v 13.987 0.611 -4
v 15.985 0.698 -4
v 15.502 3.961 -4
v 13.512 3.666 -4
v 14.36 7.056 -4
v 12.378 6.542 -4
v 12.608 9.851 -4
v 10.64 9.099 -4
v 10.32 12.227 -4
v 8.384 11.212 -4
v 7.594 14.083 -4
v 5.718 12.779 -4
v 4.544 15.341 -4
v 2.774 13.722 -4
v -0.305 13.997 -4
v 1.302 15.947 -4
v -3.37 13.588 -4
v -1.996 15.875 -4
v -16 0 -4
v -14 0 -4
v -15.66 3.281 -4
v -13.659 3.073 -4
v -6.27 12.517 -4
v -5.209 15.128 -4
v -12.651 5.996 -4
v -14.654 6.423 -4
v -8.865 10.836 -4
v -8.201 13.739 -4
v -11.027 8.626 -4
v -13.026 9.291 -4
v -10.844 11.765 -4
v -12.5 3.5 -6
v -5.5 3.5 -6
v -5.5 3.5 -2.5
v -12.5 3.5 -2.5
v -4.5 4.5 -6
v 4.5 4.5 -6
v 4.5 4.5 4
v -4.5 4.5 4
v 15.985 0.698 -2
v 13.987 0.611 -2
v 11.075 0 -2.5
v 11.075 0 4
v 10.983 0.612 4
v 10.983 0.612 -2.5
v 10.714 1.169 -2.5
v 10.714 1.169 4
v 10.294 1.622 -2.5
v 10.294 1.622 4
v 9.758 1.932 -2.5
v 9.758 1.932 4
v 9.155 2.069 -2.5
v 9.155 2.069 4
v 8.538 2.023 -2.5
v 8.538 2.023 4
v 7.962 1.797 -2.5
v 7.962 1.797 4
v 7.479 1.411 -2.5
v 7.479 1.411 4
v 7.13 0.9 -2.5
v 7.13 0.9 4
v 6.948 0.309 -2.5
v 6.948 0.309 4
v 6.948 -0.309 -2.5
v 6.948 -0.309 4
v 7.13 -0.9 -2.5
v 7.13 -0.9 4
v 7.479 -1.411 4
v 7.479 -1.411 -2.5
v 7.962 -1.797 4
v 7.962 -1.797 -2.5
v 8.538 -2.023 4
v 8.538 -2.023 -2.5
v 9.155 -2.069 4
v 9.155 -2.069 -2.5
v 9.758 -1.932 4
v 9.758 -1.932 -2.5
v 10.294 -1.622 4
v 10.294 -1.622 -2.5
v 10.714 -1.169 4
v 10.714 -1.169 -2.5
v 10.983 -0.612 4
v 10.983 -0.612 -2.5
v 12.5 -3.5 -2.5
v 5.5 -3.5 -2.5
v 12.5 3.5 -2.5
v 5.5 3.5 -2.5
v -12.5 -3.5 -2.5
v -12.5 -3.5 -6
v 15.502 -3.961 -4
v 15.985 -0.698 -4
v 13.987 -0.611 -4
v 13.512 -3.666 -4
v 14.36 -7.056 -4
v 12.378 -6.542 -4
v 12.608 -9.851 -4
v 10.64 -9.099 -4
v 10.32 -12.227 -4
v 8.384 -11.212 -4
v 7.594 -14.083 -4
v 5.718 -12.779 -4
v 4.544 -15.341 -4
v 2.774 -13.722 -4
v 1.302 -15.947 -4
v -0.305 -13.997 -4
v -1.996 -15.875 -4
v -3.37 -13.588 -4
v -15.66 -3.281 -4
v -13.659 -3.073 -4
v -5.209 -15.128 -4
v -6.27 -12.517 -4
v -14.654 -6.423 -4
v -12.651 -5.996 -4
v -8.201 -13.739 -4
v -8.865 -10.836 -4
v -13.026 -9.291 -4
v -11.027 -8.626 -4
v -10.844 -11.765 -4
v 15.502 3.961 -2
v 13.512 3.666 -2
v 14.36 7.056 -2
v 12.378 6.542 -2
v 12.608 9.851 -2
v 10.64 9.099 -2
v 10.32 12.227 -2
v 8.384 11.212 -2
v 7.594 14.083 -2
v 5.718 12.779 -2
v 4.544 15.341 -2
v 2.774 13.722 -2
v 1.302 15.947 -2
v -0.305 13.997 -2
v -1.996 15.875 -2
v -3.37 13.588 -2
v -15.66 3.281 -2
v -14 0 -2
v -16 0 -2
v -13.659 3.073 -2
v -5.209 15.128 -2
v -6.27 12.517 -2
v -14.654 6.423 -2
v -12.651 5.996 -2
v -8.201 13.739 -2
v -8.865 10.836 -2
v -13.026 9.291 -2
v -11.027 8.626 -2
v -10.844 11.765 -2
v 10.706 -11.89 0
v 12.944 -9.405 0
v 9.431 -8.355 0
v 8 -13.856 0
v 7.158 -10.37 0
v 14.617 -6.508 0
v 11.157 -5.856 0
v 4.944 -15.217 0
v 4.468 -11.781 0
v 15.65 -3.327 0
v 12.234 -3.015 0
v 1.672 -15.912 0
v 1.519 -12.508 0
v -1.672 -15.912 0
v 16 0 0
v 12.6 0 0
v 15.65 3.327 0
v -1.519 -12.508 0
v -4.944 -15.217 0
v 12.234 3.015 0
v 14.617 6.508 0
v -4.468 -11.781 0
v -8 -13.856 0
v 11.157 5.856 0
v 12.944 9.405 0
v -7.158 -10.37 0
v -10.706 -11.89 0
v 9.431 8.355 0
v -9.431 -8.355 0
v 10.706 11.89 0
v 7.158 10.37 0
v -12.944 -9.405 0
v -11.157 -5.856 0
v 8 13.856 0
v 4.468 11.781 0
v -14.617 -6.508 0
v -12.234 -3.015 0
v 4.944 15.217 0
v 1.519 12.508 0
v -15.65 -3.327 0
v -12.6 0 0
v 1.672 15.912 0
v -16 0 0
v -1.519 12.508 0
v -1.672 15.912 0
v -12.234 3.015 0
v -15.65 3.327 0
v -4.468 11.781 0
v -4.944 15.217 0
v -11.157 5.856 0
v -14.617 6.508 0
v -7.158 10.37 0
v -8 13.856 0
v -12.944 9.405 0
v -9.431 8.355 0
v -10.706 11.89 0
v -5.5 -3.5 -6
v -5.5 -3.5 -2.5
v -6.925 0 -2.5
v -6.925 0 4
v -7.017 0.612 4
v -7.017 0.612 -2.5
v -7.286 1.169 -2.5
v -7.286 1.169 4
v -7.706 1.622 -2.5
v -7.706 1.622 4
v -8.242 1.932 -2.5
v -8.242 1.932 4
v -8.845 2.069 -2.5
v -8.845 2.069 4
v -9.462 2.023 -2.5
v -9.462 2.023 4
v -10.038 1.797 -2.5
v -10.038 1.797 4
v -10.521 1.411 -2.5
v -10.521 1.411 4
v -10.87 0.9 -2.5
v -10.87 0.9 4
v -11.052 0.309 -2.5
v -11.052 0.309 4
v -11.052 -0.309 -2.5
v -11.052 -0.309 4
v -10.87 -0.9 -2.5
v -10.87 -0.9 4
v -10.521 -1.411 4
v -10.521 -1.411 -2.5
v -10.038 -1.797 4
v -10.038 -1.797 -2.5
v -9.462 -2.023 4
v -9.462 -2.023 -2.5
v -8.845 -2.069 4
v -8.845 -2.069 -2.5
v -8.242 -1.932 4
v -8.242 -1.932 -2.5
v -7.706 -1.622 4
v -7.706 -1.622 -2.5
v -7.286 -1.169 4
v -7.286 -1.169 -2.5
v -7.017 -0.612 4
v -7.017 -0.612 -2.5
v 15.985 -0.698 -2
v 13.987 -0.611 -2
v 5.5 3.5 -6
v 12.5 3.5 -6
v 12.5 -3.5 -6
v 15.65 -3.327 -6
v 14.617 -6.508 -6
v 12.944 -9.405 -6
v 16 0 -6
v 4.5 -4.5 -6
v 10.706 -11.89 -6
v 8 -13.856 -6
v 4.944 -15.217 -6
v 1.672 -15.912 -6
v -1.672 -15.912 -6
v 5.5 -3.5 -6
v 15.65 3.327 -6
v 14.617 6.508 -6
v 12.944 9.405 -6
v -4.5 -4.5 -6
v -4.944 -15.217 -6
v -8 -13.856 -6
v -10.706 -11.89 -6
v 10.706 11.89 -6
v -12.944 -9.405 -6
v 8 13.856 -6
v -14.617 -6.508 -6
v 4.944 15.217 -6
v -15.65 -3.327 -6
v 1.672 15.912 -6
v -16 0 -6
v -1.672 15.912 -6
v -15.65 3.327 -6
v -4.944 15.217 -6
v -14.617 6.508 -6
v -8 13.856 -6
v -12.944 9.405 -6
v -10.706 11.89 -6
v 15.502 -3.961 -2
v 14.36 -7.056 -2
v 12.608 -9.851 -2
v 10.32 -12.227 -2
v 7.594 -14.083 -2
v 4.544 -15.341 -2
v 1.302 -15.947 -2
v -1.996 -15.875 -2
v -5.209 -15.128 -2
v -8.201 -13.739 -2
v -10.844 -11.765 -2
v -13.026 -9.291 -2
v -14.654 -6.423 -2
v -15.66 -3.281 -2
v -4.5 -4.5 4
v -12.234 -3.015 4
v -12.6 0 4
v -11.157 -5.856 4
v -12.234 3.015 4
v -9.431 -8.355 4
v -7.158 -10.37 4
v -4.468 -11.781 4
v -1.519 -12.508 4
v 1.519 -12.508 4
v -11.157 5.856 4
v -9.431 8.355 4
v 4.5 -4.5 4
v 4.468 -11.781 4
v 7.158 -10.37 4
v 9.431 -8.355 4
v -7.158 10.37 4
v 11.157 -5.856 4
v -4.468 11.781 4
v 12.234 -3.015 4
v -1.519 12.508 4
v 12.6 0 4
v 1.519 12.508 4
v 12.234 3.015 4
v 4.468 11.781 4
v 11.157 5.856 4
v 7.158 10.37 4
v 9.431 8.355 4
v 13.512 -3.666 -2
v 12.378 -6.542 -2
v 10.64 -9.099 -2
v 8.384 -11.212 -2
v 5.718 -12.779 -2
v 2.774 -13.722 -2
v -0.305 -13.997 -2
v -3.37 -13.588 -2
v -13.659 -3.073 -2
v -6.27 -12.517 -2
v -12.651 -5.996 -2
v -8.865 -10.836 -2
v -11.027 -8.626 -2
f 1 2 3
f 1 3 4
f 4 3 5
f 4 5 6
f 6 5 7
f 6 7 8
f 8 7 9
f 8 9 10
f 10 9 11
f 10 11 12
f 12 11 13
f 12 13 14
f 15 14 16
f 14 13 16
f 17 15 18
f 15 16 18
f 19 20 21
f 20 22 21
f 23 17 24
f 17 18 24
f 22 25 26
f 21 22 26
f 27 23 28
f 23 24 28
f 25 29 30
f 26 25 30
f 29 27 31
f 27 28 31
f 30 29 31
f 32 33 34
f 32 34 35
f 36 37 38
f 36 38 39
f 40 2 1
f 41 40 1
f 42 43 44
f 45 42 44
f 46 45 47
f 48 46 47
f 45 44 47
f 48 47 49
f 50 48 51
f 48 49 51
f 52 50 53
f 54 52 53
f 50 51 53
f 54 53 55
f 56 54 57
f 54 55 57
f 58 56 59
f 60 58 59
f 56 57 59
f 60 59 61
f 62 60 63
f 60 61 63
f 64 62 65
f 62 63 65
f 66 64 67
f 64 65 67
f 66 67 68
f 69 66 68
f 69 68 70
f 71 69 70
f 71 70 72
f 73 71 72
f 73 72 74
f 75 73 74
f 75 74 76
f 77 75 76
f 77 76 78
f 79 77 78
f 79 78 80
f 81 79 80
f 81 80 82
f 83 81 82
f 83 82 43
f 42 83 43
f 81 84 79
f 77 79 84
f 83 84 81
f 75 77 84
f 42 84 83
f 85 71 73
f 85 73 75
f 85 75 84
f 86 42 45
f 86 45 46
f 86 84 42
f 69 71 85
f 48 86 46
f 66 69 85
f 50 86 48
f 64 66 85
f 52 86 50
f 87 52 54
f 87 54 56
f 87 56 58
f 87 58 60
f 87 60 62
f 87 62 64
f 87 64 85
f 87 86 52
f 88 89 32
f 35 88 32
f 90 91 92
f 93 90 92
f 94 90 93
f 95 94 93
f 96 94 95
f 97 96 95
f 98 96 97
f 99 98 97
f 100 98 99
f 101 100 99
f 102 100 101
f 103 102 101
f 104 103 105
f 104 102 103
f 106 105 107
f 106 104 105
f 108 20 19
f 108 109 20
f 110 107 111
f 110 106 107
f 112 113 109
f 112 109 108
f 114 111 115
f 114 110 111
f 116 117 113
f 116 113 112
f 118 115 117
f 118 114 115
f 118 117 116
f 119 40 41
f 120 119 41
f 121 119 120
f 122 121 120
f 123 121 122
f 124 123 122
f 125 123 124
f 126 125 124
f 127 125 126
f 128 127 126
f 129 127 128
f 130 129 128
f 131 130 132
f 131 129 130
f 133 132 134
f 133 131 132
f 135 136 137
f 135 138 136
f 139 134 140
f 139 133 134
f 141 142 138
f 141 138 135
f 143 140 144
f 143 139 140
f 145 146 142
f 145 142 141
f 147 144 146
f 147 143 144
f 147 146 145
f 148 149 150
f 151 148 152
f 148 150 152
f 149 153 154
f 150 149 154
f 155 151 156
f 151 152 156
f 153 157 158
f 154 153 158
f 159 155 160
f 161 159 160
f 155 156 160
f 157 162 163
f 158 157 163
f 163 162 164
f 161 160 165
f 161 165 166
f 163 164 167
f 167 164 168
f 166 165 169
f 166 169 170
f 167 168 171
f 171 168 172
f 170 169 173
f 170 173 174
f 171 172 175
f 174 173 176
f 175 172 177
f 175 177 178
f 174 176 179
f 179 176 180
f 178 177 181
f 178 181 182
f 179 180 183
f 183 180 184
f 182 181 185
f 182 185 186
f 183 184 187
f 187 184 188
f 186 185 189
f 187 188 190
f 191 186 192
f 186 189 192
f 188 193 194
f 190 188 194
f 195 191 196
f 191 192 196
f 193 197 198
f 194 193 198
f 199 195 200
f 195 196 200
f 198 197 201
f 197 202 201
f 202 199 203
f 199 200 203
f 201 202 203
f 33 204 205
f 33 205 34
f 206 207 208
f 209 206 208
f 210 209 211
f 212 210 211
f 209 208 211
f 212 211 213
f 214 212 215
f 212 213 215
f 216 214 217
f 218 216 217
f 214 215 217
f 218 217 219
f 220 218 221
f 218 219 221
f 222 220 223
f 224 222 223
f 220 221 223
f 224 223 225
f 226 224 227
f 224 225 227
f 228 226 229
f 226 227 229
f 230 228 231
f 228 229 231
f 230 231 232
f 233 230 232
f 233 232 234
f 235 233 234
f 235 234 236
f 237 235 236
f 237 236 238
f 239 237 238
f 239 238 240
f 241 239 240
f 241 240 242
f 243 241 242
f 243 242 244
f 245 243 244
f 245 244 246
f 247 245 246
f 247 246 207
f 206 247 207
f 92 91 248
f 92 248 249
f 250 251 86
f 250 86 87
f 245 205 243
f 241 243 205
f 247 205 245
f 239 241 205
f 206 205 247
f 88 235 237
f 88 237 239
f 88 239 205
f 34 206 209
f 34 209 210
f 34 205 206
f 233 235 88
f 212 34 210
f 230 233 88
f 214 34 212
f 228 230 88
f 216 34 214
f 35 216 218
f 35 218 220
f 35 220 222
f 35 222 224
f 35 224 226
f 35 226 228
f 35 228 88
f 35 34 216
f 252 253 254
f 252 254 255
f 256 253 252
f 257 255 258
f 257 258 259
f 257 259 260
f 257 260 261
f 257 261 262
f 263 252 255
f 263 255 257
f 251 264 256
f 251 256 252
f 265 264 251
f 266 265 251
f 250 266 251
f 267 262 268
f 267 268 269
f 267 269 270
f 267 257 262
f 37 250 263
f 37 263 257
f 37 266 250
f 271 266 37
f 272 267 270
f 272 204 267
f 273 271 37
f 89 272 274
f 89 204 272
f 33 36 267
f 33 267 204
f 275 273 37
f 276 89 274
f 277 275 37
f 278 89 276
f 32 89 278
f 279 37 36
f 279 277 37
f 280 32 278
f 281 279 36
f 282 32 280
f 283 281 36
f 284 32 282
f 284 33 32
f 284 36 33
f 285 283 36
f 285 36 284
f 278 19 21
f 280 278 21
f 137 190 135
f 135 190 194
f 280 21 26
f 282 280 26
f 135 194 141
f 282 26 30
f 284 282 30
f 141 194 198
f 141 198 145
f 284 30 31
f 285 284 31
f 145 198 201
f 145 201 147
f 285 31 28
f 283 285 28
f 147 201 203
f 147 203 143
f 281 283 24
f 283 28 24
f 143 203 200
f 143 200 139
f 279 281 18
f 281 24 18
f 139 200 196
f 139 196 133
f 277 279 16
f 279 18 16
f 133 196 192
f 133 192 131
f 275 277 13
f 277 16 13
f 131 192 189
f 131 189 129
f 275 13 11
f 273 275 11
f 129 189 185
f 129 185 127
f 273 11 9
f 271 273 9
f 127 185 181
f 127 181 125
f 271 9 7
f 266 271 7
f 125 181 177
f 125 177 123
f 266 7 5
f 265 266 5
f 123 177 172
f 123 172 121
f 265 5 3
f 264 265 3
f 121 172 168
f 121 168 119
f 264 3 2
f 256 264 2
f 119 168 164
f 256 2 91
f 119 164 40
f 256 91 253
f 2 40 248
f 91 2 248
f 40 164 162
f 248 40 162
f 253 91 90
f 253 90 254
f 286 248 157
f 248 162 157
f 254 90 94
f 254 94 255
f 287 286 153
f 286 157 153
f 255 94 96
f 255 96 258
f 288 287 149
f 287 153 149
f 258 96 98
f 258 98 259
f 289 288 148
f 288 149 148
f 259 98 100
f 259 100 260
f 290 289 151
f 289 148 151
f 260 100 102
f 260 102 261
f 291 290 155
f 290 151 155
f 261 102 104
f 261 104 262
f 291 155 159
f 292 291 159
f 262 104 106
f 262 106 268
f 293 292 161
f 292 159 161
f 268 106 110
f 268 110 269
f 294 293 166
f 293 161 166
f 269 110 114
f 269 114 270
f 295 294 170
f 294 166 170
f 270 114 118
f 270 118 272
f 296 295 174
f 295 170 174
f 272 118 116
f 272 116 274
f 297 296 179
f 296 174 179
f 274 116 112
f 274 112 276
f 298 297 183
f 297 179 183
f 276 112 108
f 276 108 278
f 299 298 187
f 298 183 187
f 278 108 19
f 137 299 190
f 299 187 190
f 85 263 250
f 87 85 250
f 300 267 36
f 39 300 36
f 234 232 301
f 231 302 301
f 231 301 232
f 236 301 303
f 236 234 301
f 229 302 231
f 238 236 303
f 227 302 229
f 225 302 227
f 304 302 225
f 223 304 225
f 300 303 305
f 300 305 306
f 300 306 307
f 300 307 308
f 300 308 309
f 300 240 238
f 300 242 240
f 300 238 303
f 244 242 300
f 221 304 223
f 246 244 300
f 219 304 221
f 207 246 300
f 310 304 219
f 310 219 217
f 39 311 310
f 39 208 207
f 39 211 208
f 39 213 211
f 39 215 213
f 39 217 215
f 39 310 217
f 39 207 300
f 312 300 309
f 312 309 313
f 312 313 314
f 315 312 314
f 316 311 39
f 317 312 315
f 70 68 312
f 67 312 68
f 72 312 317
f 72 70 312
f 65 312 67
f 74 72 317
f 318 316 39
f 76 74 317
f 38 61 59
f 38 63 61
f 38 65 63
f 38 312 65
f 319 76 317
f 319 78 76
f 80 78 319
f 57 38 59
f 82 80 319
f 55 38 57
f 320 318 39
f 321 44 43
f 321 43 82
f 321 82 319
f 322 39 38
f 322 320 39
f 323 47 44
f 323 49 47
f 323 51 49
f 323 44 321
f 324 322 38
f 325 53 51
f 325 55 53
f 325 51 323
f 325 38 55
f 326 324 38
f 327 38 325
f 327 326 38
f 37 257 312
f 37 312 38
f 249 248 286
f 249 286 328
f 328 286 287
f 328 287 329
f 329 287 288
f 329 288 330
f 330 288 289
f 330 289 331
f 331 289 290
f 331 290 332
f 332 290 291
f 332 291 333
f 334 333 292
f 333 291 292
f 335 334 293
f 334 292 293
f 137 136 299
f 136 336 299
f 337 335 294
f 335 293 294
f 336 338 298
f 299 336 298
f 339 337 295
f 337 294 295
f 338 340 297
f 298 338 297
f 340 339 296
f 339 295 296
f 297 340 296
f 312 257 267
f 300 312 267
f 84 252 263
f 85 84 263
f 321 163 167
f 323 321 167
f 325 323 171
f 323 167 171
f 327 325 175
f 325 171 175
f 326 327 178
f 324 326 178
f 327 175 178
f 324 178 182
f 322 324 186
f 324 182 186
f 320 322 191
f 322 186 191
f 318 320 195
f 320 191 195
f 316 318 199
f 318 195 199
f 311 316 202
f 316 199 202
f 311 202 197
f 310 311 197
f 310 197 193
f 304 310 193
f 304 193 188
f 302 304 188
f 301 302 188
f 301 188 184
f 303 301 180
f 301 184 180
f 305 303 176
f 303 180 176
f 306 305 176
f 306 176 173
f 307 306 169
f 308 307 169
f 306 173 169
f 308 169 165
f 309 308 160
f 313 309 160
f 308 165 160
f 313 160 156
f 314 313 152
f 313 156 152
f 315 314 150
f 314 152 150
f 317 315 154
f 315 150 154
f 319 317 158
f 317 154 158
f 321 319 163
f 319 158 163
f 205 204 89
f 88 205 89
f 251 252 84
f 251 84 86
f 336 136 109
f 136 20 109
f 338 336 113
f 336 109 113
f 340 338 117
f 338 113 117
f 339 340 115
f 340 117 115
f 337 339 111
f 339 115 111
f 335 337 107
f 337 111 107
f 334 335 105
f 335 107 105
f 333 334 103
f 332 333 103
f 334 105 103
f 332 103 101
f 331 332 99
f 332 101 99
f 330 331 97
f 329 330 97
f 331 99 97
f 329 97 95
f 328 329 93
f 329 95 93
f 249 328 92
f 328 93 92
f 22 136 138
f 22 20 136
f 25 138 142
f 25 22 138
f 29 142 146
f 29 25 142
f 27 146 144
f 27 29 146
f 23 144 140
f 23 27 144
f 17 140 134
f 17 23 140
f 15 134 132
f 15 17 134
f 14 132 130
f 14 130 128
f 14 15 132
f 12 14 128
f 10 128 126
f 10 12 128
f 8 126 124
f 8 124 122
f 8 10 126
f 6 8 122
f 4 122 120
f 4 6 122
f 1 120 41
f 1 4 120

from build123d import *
from build123d.topology import SkipClean

# Parameters (mm, degrees)
SKETCH_1_R          = 12.6
EXTRUDE_1_DEPTH     = 4
SKETCH_2_R          = 16
EXTRUDE_2_DEPTH     = 6
SKETCH_4_R          = 2.075
CUT_EXTRUDE_1_DEPTH = 29
SKETCH_6_W          = 7
SKETCH_6_H          = 7
CUT_EXTRUDE_2_DEPTH = 3.5
CUT_EXTRUDE_3_DEPTH = 31
SKETCH_14_W         = 9
SKETCH_14_H         = 9
CUT_EXTRUDE_6_DEPTH = 10
SKETCH_15_W         = 4
SKETCH_15_H         = 2
CUT_REVOLVE_1_ANGLE = 177.5


with BuildPart() as part:
    # 草图1 → 凸台-拉伸1 (new body)
    with BuildSketch(Plane.XY):
        Circle(SKETCH_1_R)
    extrude(amount=EXTRUDE_1_DEPTH)

    # 草图2 → 凸台-拉伸2 (add)
    with BuildSketch(Plane(origin=(0, 0, 0), x_dir=(-1, 0, 0), z_dir=(0, 0, -1))):
        Circle(SKETCH_2_R)
    extrude(amount=EXTRUDE_2_DEPTH)

    # 草图4 → 切除-拉伸1 (cut)
    with BuildSketch(Plane.XY.offset(4)):
        with Locations((-9, 0)):
            Circle(SKETCH_4_R)
        with Locations((9, 0)):
            Circle(SKETCH_4_R)
    extrude(amount=-CUT_EXTRUDE_1_DEPTH, mode=Mode.SUBTRACT)

    # 草图6 → 切除-拉伸2 (cut)
    with BuildSketch(Plane(origin=(0, 0, -6), x_dir=(-1, 0, 0), z_dir=(0, 0, -1))):
        with Locations((-9, 0)):
            Rectangle(SKETCH_6_W, SKETCH_6_H)
        with Locations((9, 0)):
            Rectangle(SKETCH_6_W, SKETCH_6_H)
    extrude(amount=-CUT_EXTRUDE_2_DEPTH, mode=Mode.SUBTRACT)

    # 草图7 → 切除-拉伸3 (cut)
    with BuildSketch(Plane(origin=(0, 0, -6), x_dir=(-1, 0, 0), z_dir=(0, 0, -1))):
        with BuildLine():
            Line((-1.466500938, -0.7), (1.466500938, -0.7))
            ThreePointArc((1.466500938, -0.7), (0, 1.625), (-1.466500938, -0.7))
        make_face()
    extrude(amount=-CUT_EXTRUDE_3_DEPTH, mode=Mode.SUBTRACT)

    # 草图14 → 切除-拉伸6 (cut)
    with BuildSketch(Plane(origin=(0, 0, -6), x_dir=(-1, 0, 0), z_dir=(0, 0, -1))):
        Rectangle(SKETCH_14_W, SKETCH_14_H)
    extrude(amount=-CUT_EXTRUDE_6_DEPTH, mode=Mode.SUBTRACT)

    # 草图15 → 切除-旋转1 (revolve, cut)
    with BuildSketch(Plane(origin=(0, 0, 0), x_dir=(1, 0, 0), z_dir=(0, 1, 0))):
        with Locations((-16, 3)):
            Rectangle(SKETCH_15_W, SKETCH_15_H)
    cut_revolve_1 = revolve(axis=Axis((0, 0, -6), (0, 0, 1)), revolution_arc=CUT_REVOLVE_1_ANGLE, mode=Mode.SUBTRACT)

    # 镜向1: 切除-旋转1 across plane
    with SkipClean():  # the faces are left unmerged after this step: merging them gives an invalid solid
        add(cut_revolve_1.mirror(Plane.ZX), mode=Mode.SUBTRACT)


solid = part.part
